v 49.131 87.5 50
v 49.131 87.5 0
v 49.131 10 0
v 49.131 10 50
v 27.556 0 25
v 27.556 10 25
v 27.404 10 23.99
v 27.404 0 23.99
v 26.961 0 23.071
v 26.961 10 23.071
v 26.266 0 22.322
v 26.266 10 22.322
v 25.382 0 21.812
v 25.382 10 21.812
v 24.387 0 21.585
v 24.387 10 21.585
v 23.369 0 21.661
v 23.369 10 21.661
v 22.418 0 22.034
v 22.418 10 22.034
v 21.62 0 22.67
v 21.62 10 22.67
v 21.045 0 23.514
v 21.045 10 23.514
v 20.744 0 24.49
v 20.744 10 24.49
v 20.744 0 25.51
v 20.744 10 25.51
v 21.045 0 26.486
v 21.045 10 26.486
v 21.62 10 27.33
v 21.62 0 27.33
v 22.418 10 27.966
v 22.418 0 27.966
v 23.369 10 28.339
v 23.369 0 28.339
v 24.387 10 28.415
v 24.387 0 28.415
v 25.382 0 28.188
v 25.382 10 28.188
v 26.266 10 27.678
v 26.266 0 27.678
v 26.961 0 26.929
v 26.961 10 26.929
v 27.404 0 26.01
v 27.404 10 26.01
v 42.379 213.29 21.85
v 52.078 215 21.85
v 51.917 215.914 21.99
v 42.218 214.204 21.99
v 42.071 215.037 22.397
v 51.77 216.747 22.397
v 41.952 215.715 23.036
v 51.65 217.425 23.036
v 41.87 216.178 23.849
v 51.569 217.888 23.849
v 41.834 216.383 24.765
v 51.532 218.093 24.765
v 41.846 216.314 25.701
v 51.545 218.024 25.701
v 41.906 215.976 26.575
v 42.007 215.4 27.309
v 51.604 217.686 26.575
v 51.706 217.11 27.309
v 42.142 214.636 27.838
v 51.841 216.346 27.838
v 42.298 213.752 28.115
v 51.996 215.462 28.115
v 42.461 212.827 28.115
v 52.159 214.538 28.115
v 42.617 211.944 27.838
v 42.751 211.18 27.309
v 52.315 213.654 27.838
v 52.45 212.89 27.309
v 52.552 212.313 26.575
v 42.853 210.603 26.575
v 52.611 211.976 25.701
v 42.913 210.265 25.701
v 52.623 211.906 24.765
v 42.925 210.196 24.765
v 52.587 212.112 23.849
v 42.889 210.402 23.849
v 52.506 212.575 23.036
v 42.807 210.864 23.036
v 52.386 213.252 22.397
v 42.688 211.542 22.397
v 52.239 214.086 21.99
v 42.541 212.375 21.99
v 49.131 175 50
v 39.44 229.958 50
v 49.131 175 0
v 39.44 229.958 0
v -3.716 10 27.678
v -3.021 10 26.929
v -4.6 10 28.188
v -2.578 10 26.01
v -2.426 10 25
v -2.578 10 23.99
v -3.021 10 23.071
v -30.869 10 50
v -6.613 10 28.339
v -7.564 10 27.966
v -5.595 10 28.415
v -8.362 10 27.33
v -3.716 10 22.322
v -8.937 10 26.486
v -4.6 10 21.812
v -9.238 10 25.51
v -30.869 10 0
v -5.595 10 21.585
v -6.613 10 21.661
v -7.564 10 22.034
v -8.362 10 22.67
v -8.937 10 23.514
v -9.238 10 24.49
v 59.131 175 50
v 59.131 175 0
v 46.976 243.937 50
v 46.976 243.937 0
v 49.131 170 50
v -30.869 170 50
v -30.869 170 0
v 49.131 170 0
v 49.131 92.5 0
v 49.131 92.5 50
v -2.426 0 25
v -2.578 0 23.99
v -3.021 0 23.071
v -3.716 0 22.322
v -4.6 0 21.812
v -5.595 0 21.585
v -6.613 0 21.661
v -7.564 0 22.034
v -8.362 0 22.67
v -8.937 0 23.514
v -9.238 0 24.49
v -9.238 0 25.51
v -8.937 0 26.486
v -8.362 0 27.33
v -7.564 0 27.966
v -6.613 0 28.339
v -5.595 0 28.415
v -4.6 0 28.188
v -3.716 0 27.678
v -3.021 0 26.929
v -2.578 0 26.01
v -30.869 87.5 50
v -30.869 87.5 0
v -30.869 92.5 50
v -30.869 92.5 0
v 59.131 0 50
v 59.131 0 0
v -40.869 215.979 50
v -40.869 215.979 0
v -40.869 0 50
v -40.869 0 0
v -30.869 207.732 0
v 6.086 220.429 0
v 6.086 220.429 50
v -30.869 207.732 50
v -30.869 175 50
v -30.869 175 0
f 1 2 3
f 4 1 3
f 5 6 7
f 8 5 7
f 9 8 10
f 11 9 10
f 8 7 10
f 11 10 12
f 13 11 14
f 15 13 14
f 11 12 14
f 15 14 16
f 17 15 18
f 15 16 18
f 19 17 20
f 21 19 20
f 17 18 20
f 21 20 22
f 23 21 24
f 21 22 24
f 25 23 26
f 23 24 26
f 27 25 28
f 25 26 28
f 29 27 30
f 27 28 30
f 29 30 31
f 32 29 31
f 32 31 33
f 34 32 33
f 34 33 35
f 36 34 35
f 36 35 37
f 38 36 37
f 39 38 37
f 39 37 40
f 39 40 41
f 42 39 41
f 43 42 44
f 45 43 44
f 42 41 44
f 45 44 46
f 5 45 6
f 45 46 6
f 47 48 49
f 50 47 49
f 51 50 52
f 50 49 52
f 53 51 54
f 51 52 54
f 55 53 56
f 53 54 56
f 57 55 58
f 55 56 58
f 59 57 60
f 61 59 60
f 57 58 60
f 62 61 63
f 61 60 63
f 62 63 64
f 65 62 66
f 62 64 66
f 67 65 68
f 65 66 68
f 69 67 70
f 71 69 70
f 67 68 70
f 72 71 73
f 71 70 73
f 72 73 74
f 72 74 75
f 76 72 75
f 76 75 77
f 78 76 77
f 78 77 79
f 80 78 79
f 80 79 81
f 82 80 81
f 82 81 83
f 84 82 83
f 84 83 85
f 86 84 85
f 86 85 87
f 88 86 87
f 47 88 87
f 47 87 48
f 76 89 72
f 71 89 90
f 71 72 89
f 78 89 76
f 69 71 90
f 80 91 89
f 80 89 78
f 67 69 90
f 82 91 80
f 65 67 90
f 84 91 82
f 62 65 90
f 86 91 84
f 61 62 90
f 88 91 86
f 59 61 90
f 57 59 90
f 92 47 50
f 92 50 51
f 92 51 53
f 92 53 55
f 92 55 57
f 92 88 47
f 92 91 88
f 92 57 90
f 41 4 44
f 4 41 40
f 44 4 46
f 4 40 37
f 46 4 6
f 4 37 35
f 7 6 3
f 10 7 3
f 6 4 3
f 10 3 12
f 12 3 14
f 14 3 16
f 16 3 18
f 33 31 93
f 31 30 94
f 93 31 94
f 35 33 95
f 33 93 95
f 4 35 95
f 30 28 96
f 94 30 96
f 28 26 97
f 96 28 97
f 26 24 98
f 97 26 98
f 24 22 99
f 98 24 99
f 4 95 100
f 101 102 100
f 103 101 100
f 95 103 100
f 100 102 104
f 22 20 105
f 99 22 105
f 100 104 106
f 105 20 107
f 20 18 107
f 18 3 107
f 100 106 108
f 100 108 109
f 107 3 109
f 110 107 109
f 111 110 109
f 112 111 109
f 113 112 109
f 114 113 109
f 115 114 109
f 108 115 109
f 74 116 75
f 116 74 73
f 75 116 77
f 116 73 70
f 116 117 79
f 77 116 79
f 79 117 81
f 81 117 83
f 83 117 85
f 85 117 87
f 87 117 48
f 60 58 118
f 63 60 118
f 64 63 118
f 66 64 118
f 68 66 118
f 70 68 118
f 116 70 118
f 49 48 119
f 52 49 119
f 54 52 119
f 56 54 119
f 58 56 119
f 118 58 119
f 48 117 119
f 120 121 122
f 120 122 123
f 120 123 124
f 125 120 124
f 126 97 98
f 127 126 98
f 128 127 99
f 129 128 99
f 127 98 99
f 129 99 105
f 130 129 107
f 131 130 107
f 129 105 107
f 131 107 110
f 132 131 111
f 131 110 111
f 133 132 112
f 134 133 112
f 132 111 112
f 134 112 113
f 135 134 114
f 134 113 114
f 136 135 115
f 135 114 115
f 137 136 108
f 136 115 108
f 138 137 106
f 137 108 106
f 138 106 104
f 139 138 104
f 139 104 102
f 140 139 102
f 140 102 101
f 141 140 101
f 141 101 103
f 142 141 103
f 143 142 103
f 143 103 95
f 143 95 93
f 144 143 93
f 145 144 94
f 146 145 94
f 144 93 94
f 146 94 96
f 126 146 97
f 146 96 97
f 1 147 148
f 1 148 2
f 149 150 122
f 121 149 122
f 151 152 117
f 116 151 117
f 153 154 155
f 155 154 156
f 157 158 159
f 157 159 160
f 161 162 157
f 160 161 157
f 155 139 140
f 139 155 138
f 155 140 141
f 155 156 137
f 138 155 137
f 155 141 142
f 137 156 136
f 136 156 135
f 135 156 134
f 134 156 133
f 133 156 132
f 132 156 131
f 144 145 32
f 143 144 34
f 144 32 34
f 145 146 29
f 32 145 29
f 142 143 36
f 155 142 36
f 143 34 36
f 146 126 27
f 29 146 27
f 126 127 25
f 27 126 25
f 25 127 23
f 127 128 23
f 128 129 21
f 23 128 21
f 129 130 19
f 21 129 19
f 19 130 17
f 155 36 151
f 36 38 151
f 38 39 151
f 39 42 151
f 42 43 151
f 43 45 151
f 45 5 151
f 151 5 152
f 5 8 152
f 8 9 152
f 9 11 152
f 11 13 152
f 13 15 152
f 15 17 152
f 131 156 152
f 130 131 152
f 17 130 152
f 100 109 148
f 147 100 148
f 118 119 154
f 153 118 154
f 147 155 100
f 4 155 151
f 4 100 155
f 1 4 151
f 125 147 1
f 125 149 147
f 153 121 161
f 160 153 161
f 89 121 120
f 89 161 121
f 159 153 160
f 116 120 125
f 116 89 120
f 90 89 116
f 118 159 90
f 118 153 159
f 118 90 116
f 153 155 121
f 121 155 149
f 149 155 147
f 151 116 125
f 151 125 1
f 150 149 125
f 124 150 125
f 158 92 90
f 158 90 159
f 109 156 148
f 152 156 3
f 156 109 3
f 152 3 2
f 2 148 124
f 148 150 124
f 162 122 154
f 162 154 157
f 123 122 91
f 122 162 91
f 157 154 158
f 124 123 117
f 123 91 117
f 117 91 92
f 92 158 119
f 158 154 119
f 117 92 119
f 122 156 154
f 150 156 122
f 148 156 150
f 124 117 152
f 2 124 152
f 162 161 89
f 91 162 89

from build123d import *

# Parameters (mm, degrees)
BOSS_EXTRUDE1_DEPTH = 50
SKETCH4_R           = 3.15
CUT_EXTRUDE1_DEPTH  = 10
SKETCH10_R          = 3.425
CUT_EXTRUDE5_DEPTH  = 10
SKETCH12_W          = 80
SKETCH12_H          = 5
BOSS_EXTRUDE2_DEPTH = 50


with BuildPart() as part:
    # Sketch2 → Boss-Extrude1 (new body)
    with BuildSketch(Plane.XY):
        Polygon((-40.869025982, 215.979452737), (-40.869025982, 0), (59.130974018, 0), (59.130974018, 175), (46.975601581, 243.936542711), align=None)
        Polygon((0, 10), (49.130974018, 10), (49.130974018, 87.5), (49.130974018, 175), (39.440396213, 229.957997724), (6.085967265, 220.428944505), (-30.869025982, 207.731789579), (-30.869025982, 107.989726368), (-30.869025982, 10), align=None, mode=Mode.SUBTRACT)
    extrude(amount=BOSS_EXTRUDE1_DEPTH)

    # Sketch4 → Cut-Extrude1 (cut)
    with BuildSketch(Plane(origin=(87.274719522, 15.388887785, 0), x_dir=(0, 0, -1), z_dir=(0.984807753, 0.173648178, 0))):
        with Locations((-25, 202.690370895)):
            Circle(SKETCH4_R)
    extrude(amount=-CUT_EXTRUDE1_DEPTH, mode=Mode.SUBTRACT)

    # Sketch10 → Cut-Extrude5 (cut)
    with BuildSketch(Plane(origin=(0, 10, 0), x_dir=(1, 0, 0), z_dir=(0, 1, 0))):
        with Locations((-5.851287133, -25)):
            Circle(SKETCH10_R)
        with Locations((24.130974018, -25)):
            Circle(SKETCH10_R)
    extrude(amount=-CUT_EXTRUDE5_DEPTH, mode=Mode.SUBTRACT)

    # Sketch12 → Boss-Extrude2 (add)
    with BuildSketch(Plane.XY.offset(50)):
        with Locations((9.130974018, 172.5)):
            Rectangle(SKETCH12_W, SKETCH12_H)
        with Locations((9.130974018, 90)):
            Rectangle(SKETCH12_W, SKETCH12_H)
    extrude(amount=-BOSS_EXTRUDE2_DEPTH)


solid = part.part
